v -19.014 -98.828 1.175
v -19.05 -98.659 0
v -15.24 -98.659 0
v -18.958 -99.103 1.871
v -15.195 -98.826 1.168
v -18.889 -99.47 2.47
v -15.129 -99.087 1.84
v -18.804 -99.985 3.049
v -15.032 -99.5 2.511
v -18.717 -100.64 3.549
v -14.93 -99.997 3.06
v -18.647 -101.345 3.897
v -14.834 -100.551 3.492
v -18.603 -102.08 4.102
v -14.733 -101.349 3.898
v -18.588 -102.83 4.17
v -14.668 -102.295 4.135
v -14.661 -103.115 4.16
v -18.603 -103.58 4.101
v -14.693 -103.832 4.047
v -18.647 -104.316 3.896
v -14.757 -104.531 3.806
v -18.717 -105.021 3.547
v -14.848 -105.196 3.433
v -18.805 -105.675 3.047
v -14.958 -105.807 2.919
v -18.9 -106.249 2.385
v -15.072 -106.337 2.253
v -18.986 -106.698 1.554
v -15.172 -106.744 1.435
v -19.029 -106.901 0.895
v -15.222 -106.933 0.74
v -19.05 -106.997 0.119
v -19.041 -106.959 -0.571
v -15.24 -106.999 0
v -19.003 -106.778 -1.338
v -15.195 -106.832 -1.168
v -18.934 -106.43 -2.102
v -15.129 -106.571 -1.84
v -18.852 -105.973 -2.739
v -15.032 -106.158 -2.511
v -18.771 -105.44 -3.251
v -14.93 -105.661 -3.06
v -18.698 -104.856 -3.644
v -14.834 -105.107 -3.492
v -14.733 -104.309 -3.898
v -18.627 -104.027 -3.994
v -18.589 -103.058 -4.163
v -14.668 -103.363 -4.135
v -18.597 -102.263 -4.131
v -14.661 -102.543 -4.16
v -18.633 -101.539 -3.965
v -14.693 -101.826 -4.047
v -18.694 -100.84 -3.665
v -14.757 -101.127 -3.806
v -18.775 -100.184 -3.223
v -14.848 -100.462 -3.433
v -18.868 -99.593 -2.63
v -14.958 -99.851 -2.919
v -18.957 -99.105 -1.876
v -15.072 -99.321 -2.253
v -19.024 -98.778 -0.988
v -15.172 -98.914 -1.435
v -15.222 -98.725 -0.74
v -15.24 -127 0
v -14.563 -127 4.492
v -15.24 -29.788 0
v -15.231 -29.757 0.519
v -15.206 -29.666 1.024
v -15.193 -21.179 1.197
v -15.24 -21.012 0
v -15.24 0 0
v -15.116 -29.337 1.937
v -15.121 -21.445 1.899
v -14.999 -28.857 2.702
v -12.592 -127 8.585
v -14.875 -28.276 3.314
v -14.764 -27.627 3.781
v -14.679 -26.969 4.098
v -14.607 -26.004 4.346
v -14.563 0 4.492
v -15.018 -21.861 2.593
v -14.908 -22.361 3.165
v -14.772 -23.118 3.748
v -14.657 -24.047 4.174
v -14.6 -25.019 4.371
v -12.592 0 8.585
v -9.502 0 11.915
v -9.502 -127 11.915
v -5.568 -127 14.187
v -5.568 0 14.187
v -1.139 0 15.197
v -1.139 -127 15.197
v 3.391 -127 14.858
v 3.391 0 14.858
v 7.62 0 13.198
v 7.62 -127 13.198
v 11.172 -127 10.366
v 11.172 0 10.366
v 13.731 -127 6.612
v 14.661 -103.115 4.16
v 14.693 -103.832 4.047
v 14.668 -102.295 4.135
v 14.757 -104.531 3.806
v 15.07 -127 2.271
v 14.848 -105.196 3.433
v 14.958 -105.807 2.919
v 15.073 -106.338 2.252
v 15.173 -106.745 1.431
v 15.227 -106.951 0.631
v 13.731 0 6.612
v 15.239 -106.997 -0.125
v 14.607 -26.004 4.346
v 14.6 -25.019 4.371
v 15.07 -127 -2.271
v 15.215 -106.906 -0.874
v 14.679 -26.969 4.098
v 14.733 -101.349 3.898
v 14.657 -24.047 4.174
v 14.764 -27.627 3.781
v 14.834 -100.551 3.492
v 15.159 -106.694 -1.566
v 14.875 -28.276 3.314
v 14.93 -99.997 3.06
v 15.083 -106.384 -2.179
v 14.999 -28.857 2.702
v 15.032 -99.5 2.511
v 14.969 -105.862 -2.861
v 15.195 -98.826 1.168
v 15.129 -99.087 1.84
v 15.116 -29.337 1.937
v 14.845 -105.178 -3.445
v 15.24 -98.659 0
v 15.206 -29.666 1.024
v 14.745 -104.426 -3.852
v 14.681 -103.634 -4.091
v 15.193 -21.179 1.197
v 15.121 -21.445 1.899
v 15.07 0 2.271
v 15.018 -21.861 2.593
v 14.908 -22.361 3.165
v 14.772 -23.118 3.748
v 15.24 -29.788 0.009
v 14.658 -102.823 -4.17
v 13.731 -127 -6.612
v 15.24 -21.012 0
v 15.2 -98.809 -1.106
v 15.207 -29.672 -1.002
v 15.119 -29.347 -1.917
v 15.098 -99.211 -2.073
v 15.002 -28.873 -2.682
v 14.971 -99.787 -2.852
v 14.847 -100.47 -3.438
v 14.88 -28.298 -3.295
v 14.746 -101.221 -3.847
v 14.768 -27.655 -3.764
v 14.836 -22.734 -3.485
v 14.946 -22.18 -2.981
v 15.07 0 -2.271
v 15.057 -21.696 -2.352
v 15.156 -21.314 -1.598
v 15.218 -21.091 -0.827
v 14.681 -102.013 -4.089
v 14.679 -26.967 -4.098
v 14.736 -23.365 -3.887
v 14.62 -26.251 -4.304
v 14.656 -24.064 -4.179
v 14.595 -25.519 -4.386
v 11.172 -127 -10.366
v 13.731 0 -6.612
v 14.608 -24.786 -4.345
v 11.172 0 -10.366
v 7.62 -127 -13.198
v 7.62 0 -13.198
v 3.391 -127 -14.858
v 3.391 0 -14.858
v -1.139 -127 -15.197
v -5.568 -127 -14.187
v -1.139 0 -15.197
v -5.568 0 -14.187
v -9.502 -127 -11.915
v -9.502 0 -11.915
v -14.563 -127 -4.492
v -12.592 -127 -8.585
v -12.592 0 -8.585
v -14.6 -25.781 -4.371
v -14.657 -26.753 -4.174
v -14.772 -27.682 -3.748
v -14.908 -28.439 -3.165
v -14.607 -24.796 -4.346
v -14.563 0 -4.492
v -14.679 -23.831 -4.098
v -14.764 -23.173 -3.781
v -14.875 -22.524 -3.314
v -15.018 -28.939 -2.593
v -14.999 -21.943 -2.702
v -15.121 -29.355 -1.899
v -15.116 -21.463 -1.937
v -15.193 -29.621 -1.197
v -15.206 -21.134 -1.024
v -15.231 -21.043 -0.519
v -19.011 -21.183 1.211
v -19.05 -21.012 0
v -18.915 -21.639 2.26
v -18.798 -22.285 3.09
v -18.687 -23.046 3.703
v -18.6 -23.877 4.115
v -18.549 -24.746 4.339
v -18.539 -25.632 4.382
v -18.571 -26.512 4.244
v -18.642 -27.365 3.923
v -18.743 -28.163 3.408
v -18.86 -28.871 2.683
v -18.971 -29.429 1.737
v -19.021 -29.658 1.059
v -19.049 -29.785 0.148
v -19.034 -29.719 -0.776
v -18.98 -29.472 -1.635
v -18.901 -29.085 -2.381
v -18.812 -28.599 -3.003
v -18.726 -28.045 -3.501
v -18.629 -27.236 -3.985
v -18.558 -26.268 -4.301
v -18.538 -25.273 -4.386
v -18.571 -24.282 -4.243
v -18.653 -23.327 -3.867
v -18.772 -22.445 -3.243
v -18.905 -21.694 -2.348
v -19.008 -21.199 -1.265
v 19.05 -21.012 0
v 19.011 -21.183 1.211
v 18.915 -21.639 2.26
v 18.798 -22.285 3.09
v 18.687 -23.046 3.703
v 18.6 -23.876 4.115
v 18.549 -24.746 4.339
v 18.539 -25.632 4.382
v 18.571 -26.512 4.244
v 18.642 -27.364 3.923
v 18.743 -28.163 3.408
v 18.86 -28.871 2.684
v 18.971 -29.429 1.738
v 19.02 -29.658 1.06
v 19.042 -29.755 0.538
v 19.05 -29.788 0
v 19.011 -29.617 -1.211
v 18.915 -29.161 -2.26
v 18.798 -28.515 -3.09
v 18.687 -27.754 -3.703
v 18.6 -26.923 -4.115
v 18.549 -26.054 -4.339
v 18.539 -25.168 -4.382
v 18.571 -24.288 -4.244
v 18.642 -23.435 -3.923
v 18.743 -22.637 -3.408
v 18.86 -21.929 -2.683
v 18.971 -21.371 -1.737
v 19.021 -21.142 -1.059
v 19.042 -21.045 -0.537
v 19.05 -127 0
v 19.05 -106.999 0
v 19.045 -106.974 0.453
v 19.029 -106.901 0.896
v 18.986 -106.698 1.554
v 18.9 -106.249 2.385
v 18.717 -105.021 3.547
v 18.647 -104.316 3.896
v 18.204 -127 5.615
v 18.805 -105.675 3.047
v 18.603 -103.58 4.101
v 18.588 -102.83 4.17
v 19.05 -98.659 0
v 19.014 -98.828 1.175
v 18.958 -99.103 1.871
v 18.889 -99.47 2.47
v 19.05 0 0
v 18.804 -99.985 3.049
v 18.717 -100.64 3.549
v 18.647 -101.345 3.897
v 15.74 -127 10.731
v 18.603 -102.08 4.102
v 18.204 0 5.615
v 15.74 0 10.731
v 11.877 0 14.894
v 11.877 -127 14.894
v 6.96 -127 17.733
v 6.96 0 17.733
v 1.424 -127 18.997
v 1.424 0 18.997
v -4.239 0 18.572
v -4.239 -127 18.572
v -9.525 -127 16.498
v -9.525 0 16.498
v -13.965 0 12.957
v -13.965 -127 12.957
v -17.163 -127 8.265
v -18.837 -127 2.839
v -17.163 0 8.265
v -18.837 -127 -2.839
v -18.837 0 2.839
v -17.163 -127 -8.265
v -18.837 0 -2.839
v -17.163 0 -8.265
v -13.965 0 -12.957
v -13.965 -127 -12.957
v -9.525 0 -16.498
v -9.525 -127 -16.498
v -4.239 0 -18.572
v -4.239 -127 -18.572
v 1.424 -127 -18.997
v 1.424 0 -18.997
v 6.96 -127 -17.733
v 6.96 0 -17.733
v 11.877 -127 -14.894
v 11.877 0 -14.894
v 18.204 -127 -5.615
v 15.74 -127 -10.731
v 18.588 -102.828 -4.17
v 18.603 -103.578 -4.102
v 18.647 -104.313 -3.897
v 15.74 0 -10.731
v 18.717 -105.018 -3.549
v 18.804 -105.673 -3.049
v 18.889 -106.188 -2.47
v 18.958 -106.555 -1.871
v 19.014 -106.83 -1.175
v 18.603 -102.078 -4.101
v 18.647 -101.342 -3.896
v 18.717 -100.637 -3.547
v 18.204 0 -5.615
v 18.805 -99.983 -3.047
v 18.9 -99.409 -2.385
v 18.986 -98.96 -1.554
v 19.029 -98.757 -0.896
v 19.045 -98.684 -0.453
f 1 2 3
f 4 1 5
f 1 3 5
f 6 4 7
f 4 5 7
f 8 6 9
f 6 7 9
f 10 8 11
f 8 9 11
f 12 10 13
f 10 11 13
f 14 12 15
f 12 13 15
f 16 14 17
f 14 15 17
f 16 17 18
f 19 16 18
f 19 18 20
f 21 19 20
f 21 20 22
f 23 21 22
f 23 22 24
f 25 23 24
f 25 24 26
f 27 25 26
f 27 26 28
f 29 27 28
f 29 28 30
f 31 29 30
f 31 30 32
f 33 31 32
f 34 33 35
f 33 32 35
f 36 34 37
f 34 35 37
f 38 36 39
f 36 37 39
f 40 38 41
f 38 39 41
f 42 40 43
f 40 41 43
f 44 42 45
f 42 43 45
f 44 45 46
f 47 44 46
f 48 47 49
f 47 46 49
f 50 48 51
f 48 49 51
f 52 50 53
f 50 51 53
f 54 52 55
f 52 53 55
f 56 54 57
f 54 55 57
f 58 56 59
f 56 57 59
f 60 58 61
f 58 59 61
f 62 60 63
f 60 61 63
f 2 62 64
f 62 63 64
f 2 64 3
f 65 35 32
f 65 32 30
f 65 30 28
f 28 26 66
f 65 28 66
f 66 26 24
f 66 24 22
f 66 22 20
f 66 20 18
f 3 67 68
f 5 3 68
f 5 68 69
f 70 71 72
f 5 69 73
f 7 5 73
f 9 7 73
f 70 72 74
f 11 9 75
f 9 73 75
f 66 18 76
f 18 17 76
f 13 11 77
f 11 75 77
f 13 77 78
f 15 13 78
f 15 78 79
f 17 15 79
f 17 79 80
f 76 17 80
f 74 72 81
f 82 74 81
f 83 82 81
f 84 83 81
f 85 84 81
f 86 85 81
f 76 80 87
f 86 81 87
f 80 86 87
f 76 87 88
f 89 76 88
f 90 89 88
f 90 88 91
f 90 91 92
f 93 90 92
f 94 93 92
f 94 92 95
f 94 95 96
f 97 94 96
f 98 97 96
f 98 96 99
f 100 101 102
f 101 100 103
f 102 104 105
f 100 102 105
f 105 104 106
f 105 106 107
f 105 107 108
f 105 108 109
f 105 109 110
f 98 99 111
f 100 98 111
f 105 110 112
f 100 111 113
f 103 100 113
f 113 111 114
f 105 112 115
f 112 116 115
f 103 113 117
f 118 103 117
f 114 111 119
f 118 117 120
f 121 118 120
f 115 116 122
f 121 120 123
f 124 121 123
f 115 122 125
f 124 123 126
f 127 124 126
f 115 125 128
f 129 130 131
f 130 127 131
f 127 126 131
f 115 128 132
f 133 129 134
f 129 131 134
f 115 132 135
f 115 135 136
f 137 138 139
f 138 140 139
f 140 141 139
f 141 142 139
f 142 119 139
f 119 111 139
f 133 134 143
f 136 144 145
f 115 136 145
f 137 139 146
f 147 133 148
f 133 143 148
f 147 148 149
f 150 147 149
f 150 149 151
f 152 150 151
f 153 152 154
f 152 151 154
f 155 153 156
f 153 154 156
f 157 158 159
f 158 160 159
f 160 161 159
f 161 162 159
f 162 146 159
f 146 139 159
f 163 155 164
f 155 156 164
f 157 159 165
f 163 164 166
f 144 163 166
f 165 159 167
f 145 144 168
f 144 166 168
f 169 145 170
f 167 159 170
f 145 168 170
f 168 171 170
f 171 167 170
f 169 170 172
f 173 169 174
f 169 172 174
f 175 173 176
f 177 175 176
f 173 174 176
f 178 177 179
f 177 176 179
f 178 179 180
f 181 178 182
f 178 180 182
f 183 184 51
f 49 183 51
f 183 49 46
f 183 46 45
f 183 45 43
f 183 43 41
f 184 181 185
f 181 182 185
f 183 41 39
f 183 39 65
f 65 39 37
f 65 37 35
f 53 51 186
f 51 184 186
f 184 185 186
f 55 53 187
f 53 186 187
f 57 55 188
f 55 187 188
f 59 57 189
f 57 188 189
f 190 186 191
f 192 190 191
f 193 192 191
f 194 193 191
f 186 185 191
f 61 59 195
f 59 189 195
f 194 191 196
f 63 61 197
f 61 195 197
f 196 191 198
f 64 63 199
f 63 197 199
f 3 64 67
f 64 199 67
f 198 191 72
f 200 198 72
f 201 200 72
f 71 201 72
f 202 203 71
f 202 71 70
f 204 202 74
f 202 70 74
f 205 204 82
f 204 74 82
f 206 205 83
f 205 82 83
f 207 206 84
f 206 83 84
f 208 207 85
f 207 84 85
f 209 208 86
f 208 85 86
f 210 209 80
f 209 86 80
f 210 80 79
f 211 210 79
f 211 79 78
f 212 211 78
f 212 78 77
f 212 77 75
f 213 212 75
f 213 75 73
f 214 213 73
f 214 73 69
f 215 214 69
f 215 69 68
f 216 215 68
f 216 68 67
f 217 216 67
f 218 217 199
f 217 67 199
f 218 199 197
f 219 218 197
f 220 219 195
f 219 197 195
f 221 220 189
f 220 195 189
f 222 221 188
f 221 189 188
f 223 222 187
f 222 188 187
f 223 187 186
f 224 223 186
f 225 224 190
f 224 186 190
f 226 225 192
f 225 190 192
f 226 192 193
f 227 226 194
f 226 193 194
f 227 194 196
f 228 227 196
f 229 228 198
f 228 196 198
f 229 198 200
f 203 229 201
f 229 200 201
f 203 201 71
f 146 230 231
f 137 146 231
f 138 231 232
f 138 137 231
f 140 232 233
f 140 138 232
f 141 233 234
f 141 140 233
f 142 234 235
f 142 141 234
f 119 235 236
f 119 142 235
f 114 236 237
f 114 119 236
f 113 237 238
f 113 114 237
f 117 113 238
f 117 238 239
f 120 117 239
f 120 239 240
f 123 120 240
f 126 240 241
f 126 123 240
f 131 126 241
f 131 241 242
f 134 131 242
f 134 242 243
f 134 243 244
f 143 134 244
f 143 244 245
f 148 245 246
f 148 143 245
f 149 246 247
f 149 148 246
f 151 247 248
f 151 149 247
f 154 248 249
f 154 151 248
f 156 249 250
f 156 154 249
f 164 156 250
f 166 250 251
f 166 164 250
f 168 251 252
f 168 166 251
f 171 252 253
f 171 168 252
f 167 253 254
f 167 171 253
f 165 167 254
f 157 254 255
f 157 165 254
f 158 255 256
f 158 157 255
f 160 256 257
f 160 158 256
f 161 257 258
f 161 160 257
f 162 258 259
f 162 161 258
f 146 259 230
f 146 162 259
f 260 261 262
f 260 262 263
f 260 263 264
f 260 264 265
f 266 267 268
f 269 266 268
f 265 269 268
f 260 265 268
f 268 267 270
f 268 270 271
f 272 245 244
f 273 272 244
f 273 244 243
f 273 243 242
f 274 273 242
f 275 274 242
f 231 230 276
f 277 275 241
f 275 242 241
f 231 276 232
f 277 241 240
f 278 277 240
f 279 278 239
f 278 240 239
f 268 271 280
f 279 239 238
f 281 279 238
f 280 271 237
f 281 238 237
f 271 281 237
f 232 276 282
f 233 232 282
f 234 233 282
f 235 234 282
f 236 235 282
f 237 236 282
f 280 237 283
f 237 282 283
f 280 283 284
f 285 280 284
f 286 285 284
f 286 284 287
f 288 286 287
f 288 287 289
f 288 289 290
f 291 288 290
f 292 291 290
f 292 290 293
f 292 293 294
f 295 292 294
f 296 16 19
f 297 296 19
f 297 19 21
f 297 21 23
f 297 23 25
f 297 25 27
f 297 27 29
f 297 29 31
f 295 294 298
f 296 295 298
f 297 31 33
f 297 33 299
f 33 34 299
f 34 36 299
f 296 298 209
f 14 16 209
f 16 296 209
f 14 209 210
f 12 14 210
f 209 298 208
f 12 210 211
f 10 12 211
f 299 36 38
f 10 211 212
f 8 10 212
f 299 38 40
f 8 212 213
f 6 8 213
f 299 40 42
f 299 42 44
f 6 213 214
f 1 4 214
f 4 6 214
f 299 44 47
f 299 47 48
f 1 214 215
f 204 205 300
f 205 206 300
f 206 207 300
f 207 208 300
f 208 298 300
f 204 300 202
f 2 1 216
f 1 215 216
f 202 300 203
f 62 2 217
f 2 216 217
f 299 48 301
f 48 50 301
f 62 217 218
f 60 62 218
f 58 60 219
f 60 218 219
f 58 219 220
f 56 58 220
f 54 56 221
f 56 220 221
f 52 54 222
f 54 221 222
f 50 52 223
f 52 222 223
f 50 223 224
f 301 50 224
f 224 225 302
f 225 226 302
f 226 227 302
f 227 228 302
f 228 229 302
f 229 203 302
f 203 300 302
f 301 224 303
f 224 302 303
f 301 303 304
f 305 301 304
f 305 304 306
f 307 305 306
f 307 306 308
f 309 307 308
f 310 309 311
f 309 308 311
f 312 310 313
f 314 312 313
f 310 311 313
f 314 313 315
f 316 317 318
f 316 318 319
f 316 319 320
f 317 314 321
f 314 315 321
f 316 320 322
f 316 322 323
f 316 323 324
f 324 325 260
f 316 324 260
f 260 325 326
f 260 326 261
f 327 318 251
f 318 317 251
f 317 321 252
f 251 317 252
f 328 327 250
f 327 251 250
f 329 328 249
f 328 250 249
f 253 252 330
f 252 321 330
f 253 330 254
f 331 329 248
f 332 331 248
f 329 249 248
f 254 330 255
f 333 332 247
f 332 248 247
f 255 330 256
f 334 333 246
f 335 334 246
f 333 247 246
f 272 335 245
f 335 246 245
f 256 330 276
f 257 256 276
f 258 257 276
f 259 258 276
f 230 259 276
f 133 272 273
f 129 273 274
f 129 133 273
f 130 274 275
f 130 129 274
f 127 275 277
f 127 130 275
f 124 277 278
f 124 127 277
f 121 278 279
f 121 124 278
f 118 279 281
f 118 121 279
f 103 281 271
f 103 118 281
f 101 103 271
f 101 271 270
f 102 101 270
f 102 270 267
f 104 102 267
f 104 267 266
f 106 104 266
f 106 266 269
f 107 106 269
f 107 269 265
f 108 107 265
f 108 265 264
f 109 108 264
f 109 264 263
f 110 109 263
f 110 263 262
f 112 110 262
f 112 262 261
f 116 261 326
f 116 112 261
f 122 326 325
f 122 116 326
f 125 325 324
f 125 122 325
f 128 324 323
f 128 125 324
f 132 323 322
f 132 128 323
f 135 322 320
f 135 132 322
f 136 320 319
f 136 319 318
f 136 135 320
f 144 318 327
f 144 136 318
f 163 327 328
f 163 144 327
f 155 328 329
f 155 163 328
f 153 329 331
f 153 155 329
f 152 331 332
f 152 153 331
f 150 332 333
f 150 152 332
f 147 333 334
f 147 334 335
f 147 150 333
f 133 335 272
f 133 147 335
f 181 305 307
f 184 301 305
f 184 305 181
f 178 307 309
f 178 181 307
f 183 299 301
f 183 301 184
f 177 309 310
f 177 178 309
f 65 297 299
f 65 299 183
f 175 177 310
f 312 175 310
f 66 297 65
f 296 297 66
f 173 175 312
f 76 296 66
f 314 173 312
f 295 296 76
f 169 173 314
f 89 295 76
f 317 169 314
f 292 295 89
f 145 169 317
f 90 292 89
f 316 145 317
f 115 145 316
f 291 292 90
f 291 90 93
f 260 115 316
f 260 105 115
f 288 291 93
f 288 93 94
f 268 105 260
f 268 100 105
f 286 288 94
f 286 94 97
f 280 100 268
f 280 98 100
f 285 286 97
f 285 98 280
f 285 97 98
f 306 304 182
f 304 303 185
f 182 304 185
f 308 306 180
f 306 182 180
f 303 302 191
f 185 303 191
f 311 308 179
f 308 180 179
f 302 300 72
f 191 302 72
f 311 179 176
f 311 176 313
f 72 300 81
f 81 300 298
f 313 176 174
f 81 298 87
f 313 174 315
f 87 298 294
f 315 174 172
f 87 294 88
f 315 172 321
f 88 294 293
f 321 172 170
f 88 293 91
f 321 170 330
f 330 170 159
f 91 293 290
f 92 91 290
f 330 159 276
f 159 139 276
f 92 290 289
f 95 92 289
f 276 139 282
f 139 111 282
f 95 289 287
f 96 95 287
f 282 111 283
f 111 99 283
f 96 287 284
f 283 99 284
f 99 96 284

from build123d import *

# Parameters (mm, degrees)
F0_R     = 19.05
F1_DEPTH = 127
F2_R     = 15.24
F3_DEPTH = 127
F4_R     = 4.169678
F4_R_2   = 4.387646
F5_DEPTH = 50.8
F6_DEPTH = 25.4


with BuildPart() as f1:
    # F0 (on Front) → F1 (new body)
    with BuildSketch(Plane.XZ):
        Circle(F0_R)
    extrude(amount=F1_DEPTH)

    # F2 (on face) → F3 (cut)
    with BuildSketch(Plane(origin=(0, 0, 0), x_dir=(-1, 0, 0), z_dir=(0, 1, 0))):
        Circle(F2_R)
    extrude(amount=-F3_DEPTH, mode=Mode.SUBTRACT)

    # F4 (on Right) → F5 (cut)
    with BuildSketch(Plane.YZ):
        with Locations((-102.829032, 0)):
            Circle(F4_R)
        with Locations((-25.400002, 0)):
            Circle(F4_R_2)
    extrude(amount=-F5_DEPTH, mode=Mode.SUBTRACT)

    # F4 (on Right) → F6 (cut)
    with BuildSketch(Plane.YZ):
        with Locations((-102.829032, 0)):
            Circle(F4_R)
        with Locations((-25.400002, 0)):
            Circle(F4_R_2)
    extrude(amount=F6_DEPTH, mode=Mode.SUBTRACT)


solid = f1.part
